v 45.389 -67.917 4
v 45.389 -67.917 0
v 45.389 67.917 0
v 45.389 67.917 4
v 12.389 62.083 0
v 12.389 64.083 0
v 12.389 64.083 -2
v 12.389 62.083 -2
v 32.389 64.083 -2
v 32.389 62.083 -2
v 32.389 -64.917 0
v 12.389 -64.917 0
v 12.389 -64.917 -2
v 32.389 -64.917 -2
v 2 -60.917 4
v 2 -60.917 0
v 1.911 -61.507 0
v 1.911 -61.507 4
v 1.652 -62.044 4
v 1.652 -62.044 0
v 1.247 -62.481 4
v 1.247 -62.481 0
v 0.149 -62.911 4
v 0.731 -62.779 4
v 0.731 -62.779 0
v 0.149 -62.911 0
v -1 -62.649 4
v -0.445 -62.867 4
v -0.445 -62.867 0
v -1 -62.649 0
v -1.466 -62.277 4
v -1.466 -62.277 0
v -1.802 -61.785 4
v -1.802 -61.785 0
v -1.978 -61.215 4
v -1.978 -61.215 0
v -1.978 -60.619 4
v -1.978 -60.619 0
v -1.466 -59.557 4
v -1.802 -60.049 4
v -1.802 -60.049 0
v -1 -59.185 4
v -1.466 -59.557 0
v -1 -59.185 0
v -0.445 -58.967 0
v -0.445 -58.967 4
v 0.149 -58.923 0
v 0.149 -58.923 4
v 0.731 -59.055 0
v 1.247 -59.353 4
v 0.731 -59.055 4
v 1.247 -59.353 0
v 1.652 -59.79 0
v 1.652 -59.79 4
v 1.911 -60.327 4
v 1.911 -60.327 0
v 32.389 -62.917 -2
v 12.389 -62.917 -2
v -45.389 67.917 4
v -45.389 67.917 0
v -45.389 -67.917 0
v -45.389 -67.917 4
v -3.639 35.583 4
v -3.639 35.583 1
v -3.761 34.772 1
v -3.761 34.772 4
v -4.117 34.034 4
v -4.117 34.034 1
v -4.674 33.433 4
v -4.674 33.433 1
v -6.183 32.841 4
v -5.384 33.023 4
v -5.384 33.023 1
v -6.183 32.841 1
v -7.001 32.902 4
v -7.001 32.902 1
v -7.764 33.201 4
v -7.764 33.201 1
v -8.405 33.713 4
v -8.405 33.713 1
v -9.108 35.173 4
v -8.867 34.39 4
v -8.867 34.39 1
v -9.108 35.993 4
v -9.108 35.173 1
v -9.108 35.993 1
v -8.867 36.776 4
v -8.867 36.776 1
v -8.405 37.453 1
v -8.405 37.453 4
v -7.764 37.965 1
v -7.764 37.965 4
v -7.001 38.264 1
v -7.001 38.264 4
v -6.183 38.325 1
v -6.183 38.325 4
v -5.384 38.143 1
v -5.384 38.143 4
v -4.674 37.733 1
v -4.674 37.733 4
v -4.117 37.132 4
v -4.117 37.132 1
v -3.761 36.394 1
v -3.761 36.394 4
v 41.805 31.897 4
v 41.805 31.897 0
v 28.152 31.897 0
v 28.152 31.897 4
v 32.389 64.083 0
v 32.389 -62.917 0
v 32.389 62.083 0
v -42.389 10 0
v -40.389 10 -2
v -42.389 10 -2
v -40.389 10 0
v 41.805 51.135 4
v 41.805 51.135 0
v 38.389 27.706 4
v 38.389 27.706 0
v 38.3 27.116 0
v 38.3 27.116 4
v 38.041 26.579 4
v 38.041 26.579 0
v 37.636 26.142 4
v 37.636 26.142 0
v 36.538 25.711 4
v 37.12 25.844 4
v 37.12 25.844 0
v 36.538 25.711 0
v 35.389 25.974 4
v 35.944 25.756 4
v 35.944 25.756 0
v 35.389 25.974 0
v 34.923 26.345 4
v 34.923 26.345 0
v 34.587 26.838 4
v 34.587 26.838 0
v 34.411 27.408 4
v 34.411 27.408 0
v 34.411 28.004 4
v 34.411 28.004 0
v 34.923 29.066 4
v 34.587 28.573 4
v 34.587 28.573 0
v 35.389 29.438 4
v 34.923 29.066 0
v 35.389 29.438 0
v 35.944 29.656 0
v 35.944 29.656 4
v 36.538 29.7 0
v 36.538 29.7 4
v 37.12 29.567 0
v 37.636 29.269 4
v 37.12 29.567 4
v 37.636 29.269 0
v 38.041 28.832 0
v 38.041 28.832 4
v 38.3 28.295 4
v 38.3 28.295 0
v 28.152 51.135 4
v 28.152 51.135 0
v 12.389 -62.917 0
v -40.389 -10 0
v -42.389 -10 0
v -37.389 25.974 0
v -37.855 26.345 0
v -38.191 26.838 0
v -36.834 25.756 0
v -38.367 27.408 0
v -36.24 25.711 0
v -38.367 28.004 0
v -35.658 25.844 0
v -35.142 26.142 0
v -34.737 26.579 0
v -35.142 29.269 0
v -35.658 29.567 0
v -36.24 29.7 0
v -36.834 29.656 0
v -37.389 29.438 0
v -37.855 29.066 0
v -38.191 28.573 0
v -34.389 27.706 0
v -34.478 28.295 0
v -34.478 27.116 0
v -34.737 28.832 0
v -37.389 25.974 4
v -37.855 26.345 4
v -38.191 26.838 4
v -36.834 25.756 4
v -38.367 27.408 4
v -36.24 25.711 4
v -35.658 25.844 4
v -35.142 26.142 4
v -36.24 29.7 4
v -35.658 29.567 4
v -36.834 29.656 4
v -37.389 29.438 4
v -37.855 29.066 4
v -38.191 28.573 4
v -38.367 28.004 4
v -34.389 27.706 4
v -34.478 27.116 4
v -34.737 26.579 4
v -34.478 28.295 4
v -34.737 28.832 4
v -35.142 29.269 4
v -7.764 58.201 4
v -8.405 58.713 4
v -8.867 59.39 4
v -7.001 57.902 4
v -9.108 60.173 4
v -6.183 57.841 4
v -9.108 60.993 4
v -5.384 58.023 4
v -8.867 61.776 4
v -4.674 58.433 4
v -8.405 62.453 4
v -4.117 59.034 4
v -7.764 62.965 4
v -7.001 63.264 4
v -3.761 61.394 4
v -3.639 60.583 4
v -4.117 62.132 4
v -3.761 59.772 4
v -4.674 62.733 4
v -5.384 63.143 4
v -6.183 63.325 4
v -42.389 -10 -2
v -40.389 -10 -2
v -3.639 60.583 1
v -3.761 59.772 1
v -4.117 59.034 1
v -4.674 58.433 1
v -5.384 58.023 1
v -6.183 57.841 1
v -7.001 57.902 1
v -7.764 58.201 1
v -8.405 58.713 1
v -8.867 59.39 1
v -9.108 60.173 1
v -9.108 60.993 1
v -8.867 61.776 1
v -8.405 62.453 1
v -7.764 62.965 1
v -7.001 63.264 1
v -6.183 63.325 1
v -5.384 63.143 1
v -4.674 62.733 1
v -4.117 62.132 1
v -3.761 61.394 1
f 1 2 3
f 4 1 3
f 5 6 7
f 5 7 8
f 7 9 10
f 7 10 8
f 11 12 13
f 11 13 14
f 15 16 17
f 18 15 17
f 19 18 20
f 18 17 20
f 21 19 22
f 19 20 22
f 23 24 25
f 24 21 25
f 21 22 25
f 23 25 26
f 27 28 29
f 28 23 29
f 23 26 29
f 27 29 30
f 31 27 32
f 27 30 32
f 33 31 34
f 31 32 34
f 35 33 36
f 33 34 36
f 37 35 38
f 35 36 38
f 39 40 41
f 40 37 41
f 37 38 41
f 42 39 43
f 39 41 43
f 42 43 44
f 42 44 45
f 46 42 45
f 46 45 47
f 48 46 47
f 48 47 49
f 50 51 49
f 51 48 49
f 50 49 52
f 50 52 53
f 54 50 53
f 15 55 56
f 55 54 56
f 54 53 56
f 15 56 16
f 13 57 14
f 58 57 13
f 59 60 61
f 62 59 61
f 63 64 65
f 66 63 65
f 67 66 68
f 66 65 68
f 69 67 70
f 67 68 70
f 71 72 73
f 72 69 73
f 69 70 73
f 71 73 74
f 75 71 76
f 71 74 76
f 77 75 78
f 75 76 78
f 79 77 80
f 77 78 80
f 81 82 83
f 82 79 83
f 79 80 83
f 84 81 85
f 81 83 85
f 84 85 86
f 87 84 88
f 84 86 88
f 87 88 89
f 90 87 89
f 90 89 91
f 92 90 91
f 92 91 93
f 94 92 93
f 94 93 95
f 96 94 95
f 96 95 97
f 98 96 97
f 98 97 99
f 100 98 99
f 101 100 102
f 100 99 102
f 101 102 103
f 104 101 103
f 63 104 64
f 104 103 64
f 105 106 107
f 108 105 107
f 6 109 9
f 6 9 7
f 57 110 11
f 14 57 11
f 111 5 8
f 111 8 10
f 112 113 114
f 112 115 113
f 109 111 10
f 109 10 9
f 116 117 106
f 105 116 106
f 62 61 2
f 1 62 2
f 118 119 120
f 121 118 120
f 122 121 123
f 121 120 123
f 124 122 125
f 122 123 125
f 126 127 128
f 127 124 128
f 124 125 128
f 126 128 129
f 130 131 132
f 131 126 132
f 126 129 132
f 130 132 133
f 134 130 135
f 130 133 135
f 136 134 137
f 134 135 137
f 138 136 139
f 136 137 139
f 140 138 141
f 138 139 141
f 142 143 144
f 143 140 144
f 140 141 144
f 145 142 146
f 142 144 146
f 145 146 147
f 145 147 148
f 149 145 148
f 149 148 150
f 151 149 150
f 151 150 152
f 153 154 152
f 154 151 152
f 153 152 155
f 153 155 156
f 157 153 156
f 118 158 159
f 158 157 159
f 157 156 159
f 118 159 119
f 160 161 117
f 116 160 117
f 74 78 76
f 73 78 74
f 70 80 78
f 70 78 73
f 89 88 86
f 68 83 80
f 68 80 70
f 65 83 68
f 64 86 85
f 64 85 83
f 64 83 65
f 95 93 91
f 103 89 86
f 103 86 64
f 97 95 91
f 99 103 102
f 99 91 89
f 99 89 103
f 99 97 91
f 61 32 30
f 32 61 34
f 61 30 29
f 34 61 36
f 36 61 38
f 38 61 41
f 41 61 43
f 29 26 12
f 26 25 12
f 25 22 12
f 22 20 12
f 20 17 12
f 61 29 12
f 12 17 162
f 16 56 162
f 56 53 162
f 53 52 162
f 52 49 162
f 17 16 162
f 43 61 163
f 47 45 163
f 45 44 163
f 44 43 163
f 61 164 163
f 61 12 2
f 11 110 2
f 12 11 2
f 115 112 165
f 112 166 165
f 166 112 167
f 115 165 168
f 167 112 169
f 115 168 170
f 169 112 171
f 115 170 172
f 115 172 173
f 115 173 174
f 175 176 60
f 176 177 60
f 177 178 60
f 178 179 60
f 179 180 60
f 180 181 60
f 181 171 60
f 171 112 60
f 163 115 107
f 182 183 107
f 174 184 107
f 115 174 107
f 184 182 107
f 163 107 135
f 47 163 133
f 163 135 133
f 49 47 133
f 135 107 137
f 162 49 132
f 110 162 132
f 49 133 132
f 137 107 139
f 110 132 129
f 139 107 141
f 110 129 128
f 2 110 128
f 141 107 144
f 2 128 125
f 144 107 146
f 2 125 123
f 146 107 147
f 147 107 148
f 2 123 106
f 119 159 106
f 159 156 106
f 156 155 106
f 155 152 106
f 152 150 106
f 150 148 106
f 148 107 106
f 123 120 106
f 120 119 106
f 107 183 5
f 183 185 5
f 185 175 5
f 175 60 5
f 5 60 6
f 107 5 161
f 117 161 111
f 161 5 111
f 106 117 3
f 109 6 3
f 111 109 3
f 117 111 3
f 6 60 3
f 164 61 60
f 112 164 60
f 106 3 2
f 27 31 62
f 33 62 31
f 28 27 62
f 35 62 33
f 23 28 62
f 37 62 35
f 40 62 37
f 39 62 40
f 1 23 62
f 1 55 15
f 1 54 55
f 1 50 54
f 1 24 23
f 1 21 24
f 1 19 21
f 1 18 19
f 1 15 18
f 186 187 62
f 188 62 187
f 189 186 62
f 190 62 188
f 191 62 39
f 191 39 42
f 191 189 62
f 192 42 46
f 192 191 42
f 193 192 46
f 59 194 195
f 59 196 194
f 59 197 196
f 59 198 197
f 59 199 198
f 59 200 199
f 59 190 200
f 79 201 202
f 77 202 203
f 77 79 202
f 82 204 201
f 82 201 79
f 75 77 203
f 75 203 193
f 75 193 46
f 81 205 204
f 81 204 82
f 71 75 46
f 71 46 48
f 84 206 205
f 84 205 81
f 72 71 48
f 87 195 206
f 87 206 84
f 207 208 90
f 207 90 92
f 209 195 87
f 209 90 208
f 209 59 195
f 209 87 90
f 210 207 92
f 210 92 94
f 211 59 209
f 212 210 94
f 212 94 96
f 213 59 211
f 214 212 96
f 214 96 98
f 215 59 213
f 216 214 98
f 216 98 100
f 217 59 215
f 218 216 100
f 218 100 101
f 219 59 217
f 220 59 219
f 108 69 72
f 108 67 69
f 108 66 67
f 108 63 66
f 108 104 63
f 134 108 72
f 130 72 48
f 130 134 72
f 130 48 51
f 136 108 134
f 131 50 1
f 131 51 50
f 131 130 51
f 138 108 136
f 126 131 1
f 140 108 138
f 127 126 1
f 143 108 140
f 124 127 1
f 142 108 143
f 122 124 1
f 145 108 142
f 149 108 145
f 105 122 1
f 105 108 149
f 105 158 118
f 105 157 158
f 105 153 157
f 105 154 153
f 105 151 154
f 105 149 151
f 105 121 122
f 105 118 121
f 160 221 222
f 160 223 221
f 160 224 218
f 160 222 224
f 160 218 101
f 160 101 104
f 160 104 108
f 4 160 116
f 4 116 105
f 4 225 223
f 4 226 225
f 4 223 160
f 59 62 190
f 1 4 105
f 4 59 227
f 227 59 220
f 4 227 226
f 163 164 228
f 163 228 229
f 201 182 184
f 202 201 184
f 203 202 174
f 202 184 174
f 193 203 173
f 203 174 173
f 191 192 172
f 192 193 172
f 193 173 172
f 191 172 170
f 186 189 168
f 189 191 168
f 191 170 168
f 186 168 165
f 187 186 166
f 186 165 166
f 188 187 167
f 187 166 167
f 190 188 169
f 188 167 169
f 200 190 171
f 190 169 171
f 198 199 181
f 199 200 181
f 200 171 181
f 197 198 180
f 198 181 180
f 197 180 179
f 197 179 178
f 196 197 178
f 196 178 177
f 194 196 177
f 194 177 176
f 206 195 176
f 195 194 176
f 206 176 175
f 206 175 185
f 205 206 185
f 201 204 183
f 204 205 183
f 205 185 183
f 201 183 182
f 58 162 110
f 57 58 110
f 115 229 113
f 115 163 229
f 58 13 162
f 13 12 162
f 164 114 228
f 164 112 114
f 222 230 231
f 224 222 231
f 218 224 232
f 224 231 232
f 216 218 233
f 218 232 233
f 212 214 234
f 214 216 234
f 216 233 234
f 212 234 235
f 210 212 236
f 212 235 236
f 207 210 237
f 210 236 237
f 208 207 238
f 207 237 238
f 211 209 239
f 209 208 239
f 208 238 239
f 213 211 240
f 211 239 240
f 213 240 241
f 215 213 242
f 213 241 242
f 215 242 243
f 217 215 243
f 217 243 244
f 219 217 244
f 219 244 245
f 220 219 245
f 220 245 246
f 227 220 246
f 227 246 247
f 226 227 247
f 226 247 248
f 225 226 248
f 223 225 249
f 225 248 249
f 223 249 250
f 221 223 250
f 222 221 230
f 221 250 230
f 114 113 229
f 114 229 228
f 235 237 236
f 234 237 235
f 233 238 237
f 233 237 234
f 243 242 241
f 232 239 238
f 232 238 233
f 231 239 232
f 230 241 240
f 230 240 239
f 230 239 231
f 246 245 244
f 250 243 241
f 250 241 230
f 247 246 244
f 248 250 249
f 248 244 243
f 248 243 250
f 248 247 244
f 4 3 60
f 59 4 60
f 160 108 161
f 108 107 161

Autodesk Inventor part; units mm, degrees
ref_plane "YZ Plane" through (0, 0, 0) normal (1, 0, 0) x (0, 1, 0)
ref_plane "XZ Plane" through (0, 0, 0) normal (0, 1, 0) x (-1, 0, 0)
ref_plane "XY Plane" through (0, 0, 0) normal (0, 0, 1) x (1, 0, 0)
ref_plane "РабПлоскость1" through (0, 0, 0) normal (0, 0, 1) x (1, 0, 0)
sketch "Эскиз1" plane through (0, 0, 0) normal (0, 0, 1) x (1, 0, 0)
  line L0 (45.389, -67.917) -> (45.389, 67.917)
  line L1 (45.389, 67.917) -> (-45.389, 67.917)
  line L2 (-45.389, -67.917) -> (45.389, -67.917)
  line L3 (-45.389, 67.917) -> (-45.389, -67.917)
  line L4 (41.8047, 51.1354) -> (28.1516, 51.1354)
  line L5 (28.1516, 51.1354) -> (28.1516, 31.897)
  line L6 (28.1516, 31.897) -> (41.8047, 31.897)
  line L7 (41.8047, 31.897) -> (41.8047, 51.1354)
  circle A0 centre (36.389, 27.7057) radius 2.75
  circle A1 centre (0, -60.917) radius 2.75
  circle A2 centre (-36.389, 27.7057) radius 2.75
  circle A3 centre (36.389, 27.7057) radius 2
  circle A4 centre (0, -60.917) radius 2
  circle A5 centre (-36.389, 27.7057) radius 2
  point P0 (0, 0)
extrude "Выдавливание1" add sketch "Эскиз1" along normal blind 3 contours L2 L3 L1 L0 | A0 | A1 | A2
sketch "Эскиз2" plane through (0, 0, 0) normal (0, 0, -1) x (-1, 0, 0)
  line L0 (42.389, -64.917) -> (-42.389, -64.917) projected
  line L1 (-42.389, -64.917) -> (-42.389, 54.5577) projected
  line L2 (-42.611, 64.083) -> (10.389, 64.083) projected
  line L3 (42.389, 64.917) -> (42.389, -64.917) projected
  line L4 (-32.389, -64.917) -> (-12.389, -64.917)
  line L5 (-12.389, -64.917) -> (-12.389, -62.917)
  line L6 (-12.389, -62.917) -> (-32.389, -62.917)
  line L7 (-32.389, -62.917) -> (-32.389, -64.917)
  line L8 (-32.389, 64.083) -> (-12.389, 64.083)
  line L9 (-12.389, 64.083) -> (-12.389, 62.083)
  line L10 (-12.389, 62.083) -> (-32.389, 62.083)
  line L11 (-32.389, 62.083) -> (-32.389, 64.083)
  line L12 (-32.389, 62.083) -> (-12.389, 62.083)
  line L13 (-12.389, 62.083) -> (-12.389, 60.083)
  line L14 (-12.389, 60.083) -> (-32.389, 60.083)
  line L15 (-32.389, 60.083) -> (-32.389, 62.083)
  line L16 (42.389, -10) -> (40.389, -10)
  line L17 (40.389, -10) -> (40.389, 10)
  line L18 (40.389, 10) -> (42.389, 10)
  line L19 (42.389, 10) -> (42.389, -10)
  point P0 (0, 0)
  point P1 (-12.389, 64.083)
  dimension "d5" = 20
  dimension "d6" = 10
  dimension "d7" = 2
  dimension "d8" = 2
  dimension "d9" = 2
  dimension "d10" = 2
  dimension "d11" = 20
  dimension "d12" = 10
extrude "Выдавливание2" add sketch "Эскиз2" along normal blind 2 contours L0 L7 L6 L5 | L16 L17 L18 L3 | L2 L9 L10 L11
sketch "Эскиз3" plane through (0, 0, 3) normal (0, 0, 1) x (1, 0, 0)
  circle A0 centre (-6.389, 60.583) radius 2.75 projected
  circle A1 centre (-6.389, 35.583) radius 2.75 projected
  point P0 (0, 0)
extrude "Выдавливание3" cut sketch "Эскиз3" against normal blind 2
sketch "Эскиз4" plane through (0, 0, 3) normal (0, 0, 1) x (1, 0, 0)
  line L0 (-33.889, -18.417) -> (41.111, -18.417) projected
  circle A0 centre (-6.389, 35.583) radius 2.75 projected
  circle A1 centre (-6.389, 60.583) radius 2.75 projected
  line L1 (45.389, 67.917) -> (-45.389, 67.917) projected
  line L2 (-45.389, 67.917) -> (-45.389, -67.917) projected
  line L3 (-45.389, -67.917) -> (45.389, -67.917) projected
  line L4 (45.389, -67.917) -> (45.389, 67.917) projected
  circle A2 centre (36.389, 27.7057) radius 2 projected
  circle A3 centre (0, -60.917) radius 2 projected
  circle A4 centre (-36.389, 27.7057) radius 2 projected
  line L5 (41.8047, 51.1354) -> (41.8047, 31.897) projected
  line L6 (41.8047, 31.897) -> (28.1516, 31.897) projected
  line L7 (28.1516, 31.897) -> (28.1516, 51.1354) projected
  line L8 (28.1516, 51.1354) -> (41.8047, 51.1354) projected
  point P0 (0, 0)
extrude "Выдавливание4" add sketch "Эскиз4" along normal blind 1
equation "\"d9\" = d8"
properties part number "top"
